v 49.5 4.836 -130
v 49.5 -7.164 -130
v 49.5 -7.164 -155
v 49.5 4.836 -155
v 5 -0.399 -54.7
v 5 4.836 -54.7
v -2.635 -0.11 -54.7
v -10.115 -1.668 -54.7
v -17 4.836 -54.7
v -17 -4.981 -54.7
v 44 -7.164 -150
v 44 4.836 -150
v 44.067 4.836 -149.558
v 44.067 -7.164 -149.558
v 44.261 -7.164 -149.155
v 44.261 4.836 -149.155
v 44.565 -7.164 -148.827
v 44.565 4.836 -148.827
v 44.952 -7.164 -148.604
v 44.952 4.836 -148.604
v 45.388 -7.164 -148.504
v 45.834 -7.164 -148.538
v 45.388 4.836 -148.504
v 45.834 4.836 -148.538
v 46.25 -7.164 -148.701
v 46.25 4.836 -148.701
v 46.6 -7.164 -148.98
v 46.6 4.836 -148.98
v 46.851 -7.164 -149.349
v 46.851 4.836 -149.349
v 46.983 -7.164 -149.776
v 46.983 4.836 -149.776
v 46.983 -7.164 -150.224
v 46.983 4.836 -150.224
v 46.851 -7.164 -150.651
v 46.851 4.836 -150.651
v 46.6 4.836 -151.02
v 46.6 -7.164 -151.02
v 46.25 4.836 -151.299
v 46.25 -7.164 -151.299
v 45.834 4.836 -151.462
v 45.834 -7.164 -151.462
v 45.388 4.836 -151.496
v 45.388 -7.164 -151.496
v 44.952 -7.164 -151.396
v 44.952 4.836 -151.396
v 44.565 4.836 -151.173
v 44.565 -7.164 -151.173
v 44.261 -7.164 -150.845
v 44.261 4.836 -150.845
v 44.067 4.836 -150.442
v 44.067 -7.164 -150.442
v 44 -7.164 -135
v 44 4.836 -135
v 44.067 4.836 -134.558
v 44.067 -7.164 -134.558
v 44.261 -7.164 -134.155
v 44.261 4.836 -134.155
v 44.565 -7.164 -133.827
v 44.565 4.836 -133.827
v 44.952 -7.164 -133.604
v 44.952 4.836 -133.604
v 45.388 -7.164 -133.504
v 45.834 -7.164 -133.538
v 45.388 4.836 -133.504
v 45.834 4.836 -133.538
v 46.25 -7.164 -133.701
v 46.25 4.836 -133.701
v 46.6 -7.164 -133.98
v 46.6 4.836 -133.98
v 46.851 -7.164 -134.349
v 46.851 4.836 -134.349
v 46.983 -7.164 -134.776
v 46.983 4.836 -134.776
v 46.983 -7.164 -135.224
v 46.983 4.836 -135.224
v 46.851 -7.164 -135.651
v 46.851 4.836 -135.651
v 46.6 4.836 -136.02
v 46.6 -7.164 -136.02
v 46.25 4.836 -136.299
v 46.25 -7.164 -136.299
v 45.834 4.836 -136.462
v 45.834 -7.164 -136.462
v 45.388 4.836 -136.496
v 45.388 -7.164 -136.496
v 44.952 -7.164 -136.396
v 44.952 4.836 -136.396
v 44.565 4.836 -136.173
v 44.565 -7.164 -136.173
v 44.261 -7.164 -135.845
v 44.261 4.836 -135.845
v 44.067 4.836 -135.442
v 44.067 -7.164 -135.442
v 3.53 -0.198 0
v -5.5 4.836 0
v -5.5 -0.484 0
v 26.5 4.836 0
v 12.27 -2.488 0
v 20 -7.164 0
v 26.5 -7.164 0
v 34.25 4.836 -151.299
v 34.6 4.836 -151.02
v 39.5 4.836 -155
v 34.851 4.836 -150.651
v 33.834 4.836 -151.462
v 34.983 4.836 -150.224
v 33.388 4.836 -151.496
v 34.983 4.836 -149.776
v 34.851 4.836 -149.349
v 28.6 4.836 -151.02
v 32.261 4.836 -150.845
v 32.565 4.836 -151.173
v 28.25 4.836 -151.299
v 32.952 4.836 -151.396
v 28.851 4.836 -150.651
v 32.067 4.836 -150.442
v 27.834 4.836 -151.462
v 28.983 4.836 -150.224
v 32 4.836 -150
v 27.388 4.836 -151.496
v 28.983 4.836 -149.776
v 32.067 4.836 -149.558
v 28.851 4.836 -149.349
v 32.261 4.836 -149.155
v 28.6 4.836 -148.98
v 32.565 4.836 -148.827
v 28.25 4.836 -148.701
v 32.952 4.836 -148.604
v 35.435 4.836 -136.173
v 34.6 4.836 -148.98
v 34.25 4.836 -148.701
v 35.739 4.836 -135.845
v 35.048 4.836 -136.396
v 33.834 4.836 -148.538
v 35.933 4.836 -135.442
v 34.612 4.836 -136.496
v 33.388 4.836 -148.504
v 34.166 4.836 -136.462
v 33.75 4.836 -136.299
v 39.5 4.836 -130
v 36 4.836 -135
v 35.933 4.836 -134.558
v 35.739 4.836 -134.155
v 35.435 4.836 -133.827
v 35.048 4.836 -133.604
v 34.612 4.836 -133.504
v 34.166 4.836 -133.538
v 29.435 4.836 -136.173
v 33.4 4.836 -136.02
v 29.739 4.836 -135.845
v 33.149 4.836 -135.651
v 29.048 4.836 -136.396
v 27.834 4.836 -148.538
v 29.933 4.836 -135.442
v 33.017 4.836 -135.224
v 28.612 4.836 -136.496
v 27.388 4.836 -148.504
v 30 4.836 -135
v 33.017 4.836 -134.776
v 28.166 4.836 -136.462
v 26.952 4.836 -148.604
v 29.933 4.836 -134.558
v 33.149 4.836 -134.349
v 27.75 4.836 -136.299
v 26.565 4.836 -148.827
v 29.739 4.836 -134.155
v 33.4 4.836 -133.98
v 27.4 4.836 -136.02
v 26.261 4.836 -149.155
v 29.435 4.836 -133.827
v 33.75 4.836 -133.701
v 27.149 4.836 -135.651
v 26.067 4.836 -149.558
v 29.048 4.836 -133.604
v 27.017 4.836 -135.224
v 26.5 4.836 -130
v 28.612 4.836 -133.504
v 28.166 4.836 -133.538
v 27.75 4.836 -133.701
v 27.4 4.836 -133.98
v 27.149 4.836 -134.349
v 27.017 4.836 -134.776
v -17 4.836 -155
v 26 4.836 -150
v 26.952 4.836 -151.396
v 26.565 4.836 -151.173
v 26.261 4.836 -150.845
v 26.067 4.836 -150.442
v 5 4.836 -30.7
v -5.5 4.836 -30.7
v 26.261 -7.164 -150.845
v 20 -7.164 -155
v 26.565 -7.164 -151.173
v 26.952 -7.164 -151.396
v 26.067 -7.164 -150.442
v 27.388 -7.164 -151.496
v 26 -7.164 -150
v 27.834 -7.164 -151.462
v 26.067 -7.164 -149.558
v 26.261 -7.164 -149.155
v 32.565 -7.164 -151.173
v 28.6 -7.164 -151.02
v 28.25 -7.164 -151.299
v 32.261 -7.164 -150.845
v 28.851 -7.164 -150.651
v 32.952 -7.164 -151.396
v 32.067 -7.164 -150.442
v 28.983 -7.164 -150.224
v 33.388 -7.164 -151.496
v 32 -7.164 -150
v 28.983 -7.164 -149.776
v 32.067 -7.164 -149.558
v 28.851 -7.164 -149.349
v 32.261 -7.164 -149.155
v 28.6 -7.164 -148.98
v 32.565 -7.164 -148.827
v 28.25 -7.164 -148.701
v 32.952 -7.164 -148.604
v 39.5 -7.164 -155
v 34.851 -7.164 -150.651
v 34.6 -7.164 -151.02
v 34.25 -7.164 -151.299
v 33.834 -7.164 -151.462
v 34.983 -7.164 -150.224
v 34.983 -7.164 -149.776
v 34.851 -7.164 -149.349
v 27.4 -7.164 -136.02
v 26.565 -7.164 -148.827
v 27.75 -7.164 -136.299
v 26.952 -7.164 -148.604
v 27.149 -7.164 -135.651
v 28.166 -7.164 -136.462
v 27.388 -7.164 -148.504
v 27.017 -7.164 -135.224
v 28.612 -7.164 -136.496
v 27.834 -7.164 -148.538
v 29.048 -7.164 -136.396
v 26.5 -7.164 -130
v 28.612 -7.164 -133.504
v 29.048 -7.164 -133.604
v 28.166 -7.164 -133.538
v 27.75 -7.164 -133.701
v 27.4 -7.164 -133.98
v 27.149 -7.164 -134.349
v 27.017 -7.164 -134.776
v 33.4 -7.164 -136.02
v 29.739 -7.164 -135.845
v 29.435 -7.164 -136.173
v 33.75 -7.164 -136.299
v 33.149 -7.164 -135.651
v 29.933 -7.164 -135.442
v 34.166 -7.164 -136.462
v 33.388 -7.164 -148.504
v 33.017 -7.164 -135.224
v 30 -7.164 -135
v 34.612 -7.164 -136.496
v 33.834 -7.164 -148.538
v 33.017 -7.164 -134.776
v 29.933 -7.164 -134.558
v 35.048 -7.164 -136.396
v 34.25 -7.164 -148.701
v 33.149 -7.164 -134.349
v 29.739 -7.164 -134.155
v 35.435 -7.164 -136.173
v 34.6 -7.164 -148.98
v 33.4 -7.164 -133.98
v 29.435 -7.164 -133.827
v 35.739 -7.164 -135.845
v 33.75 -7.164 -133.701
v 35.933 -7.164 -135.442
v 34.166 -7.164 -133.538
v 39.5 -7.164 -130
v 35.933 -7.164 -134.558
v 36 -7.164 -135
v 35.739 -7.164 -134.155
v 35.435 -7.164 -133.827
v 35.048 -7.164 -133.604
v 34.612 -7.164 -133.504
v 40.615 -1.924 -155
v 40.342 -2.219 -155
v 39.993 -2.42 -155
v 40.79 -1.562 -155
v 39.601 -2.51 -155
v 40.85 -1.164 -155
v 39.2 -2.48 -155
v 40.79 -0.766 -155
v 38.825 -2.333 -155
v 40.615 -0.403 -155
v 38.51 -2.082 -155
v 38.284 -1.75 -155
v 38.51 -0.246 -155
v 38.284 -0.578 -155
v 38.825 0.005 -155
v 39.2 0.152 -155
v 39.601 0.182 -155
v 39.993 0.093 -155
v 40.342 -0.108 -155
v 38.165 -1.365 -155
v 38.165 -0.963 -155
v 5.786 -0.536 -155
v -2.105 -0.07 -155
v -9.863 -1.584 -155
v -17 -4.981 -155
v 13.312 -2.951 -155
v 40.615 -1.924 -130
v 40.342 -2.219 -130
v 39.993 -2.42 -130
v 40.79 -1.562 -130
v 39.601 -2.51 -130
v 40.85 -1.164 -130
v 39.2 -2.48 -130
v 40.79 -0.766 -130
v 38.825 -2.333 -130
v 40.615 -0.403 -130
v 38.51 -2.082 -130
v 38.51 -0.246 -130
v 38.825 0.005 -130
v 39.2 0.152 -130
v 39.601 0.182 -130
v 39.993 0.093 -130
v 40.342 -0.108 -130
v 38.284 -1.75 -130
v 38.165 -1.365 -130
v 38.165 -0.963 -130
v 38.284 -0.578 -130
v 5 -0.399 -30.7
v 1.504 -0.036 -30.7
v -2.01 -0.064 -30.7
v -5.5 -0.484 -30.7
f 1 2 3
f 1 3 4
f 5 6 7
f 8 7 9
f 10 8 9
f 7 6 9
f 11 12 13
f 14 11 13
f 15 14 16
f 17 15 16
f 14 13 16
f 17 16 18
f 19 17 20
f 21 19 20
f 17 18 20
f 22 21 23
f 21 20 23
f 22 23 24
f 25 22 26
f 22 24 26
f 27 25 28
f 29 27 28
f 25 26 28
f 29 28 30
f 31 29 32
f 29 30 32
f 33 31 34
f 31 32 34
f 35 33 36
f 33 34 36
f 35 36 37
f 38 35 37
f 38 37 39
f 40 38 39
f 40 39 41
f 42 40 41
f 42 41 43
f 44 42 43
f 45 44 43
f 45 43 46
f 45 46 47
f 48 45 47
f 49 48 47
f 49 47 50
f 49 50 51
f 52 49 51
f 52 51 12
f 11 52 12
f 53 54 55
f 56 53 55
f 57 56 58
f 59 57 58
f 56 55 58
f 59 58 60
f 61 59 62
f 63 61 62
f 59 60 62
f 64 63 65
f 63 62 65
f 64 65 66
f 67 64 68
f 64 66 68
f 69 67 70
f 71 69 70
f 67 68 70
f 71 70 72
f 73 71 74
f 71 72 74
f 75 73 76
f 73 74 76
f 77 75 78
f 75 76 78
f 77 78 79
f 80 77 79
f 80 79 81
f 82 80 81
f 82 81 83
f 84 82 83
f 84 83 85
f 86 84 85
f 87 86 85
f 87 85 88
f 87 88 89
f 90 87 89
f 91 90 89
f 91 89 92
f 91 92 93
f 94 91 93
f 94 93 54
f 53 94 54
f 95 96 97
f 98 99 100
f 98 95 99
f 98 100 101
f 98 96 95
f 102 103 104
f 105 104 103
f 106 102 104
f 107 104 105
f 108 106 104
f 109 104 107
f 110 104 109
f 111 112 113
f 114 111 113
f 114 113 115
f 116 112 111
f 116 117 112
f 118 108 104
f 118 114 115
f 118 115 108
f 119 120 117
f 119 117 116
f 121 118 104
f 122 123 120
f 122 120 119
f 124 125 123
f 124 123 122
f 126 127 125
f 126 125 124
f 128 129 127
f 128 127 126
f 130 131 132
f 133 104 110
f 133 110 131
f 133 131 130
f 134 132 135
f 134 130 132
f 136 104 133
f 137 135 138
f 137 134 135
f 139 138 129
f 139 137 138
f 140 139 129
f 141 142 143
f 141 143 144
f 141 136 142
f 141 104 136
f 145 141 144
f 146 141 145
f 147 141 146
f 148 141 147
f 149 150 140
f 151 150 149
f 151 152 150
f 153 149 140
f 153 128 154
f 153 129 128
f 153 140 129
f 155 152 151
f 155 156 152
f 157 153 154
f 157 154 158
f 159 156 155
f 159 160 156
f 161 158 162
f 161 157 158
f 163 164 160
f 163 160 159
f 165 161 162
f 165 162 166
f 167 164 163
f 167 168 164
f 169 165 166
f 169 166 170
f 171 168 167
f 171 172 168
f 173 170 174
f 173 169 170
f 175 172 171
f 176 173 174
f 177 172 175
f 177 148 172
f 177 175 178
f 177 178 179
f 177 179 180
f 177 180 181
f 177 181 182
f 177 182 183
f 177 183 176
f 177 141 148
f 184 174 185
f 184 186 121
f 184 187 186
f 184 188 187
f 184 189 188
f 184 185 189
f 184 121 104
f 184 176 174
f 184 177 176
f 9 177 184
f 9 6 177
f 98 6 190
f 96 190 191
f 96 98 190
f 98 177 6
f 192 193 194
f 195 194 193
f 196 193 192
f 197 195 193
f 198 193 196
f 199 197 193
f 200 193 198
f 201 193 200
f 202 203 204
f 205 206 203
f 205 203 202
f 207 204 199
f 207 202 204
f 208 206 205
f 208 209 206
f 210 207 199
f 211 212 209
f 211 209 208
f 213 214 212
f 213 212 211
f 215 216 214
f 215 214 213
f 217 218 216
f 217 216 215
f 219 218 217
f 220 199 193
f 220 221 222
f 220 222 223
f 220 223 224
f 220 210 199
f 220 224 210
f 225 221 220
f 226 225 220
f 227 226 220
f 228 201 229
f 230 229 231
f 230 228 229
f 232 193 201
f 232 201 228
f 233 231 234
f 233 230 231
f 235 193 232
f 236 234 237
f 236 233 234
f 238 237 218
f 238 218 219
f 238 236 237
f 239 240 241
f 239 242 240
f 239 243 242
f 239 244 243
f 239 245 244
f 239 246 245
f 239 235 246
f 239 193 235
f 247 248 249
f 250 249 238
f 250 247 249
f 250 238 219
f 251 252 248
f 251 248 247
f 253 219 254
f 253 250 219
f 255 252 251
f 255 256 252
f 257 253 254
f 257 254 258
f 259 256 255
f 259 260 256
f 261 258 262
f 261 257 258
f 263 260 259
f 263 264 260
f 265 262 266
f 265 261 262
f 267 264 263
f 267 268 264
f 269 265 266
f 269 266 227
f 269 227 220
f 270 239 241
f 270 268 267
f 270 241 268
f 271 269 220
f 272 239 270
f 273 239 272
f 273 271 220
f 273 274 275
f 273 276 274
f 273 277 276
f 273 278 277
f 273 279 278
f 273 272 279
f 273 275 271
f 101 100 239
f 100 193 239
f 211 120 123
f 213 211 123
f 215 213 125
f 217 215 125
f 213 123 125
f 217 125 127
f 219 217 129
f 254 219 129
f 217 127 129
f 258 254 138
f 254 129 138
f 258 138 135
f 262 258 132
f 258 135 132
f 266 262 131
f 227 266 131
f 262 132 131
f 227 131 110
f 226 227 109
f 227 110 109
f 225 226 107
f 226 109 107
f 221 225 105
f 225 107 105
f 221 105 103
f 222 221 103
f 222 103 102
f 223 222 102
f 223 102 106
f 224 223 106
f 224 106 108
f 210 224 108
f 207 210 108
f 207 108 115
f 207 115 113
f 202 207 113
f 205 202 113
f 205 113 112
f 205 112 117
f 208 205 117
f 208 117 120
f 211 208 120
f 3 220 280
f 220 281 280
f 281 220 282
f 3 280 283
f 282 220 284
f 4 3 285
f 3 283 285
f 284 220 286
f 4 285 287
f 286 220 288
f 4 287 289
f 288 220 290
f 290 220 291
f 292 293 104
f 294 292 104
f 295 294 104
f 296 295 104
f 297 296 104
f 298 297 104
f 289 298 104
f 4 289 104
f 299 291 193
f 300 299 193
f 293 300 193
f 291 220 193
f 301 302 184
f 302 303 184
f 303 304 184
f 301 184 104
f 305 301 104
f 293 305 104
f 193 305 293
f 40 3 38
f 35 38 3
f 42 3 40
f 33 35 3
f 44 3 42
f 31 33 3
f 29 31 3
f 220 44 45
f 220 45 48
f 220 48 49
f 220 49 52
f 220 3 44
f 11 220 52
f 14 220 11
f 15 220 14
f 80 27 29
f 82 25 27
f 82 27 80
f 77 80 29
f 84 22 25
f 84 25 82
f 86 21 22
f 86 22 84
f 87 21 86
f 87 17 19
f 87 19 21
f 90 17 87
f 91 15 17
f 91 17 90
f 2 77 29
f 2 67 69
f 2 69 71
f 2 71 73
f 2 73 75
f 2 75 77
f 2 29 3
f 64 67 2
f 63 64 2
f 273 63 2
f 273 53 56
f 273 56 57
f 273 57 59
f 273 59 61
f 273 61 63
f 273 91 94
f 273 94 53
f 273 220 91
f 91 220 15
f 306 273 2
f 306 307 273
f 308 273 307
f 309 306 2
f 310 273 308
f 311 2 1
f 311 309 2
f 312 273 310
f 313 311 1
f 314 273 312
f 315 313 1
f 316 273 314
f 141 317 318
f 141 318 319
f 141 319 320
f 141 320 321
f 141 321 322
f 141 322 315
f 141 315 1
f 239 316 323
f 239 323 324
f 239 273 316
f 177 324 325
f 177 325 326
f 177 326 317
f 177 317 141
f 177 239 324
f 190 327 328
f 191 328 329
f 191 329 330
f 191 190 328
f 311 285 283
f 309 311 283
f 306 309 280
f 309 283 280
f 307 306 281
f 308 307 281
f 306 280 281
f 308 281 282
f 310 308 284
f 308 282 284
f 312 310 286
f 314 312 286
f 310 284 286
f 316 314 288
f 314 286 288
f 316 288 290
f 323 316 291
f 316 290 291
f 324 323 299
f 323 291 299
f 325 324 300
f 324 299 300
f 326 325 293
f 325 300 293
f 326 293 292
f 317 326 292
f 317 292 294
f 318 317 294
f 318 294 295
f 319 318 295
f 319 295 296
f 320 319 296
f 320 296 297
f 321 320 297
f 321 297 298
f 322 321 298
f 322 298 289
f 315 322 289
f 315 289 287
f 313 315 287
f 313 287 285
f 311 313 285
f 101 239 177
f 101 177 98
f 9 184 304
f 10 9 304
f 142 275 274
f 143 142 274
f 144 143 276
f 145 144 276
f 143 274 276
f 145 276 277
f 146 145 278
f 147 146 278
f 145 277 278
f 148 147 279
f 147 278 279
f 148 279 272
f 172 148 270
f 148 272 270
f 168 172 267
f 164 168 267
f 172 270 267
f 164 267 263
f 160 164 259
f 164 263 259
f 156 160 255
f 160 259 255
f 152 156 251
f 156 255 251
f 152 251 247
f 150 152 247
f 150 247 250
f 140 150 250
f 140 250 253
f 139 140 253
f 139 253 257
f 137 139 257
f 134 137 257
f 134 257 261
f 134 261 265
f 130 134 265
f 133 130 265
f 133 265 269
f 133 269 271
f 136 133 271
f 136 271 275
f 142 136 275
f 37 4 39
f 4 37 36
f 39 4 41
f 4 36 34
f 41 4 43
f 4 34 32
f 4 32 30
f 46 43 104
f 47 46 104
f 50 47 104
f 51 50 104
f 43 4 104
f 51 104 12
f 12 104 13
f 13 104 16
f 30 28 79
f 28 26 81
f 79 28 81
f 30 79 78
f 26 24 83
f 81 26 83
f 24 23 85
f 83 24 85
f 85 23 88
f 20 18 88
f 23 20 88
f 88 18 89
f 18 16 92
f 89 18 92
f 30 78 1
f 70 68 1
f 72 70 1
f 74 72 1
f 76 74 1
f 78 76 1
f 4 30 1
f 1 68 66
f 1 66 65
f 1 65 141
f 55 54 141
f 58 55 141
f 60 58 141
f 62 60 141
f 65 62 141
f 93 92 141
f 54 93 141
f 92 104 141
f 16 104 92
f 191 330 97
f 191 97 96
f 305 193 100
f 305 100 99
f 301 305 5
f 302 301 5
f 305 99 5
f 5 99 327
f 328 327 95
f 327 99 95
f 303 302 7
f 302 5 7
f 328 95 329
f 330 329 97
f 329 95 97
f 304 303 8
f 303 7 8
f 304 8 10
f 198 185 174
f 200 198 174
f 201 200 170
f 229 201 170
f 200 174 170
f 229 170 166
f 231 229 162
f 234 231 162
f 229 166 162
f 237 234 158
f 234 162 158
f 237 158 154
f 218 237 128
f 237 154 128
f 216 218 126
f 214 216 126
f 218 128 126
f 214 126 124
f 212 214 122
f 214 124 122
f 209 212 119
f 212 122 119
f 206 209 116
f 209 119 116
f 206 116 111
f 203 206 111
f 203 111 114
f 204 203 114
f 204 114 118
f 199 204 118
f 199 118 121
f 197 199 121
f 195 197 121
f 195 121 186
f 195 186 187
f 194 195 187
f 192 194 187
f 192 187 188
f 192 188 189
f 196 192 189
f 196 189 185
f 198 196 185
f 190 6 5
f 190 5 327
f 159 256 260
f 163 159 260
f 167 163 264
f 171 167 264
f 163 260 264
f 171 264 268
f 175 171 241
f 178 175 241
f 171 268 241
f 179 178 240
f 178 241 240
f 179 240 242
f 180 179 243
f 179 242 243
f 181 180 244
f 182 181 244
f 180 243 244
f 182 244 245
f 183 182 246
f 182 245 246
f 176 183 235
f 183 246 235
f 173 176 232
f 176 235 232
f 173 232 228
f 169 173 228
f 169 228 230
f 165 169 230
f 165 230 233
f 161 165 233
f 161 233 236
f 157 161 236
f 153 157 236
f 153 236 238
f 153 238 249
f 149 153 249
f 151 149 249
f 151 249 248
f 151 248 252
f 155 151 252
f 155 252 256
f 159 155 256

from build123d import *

# Parameters (mm, degrees)
PAD_DEPTH       = 155
SKETCH001_R     = 1.5
SKETCH001_W     = 13
SKETCH001_H     = 130
POCKET_DEPTH    = 12.001
SKETCH002_W     = 5.583172
SKETCH002_H     = 23.950112
POCKET001_DEPTH = 155.001
SKETCH003_W     = 22
SKETCH003_H     = 24
POCKET002_DEPTH = 12.001
SKETCH004_W     = 11.5
SKETCH004_H     = 12.924639
POCKET003_DEPTH = 31
SKETCH005_W     = 12
SKETCH005_H     = 25
PAD001_DEPTH    = 10
SKETCH006_R     = 1.35
POCKET004_DEPTH = 155.001
SKETCH007_R     = 1.5
POCKET005_DEPTH = 12.001003


with BuildPart() as part:
    # Sketch → Pad (new body)
    with BuildSketch(Plane.XY):
        with BuildLine():
            Line((39.5, 4.836187), (-20, 4.836187))
            Line((-20, 4.836187), (-20, -7.163813))
            ThreePointArc((20, -7.163813), (0, 0), (-20, -7.163813))
            Line((20, -7.163813), (39.5, -7.163813))
            Line((39.5, 4.836187), (39.5, -7.163813))
        make_face()
    extrude(amount=-PAD_DEPTH)

    # Sketch001 → Pocket (cut, through all)
    with BuildSketch(Plane.XZ.offset(7.163813)):
        with Locations((28.5, -135)):
            Circle(SKETCH001_R)
        with Locations((34.5, -135)):
            Circle(SKETCH001_R)
        with Locations((33, -65)):
            Rectangle(SKETCH001_W, SKETCH001_H)
    extrude(amount=-POCKET_DEPTH, mode=Mode.SUBTRACT)

    # Sketch002 → Pocket001 (cut, through all)
    with BuildSketch(Plane(origin=(0, 0, -155), x_dir=(1, 0, 0), z_dir=(0, 0, -1))):
        with Locations((-19.791586, -0.240771)):
            Rectangle(SKETCH002_W, SKETCH002_H)
    extrude(amount=-POCKET001_DEPTH, mode=Mode.SUBTRACT)

    # Sketch003 → Pocket002 (cut, through all)
    with BuildSketch(Plane(origin=(0, 4.836187, 0), x_dir=(-1, 0, 0), z_dir=(0, 1, 0))):
        with Locations((6, -42.7)):
            Rectangle(SKETCH003_W, SKETCH003_H)
    extrude(amount=-POCKET002_DEPTH, mode=Mode.SUBTRACT)

    # Sketch004 → Pocket003 (cut)
    with BuildSketch(Plane.XY):
        with Locations((-11.25, 0.936987)):
            Rectangle(SKETCH004_W, SKETCH004_H)
    extrude(amount=-POCKET003_DEPTH, mode=Mode.SUBTRACT)

    # Sketch005 → Pad001 (new body)
    with BuildSketch(Plane.YZ.offset(39.5)):
        with Locations((-1.16381, -142.5)):
            Rectangle(SKETCH005_W, SKETCH005_H)
    extrude(amount=PAD001_DEPTH)

    # Sketch006 → Pocket004 (cut, through all)
    with BuildSketch(Plane(origin=(0, 0, -155), x_dir=(1, 0, 0), z_dir=(0, 0, -1))):
        with Locations((39.5, 1.16381)):
            Circle(SKETCH006_R)
    extrude(amount=-POCKET004_DEPTH, mode=Mode.SUBTRACT)

    # Sketch007 → Pocket005 (cut, through all)
    with BuildSketch(Plane(origin=(0, 4.83619, 0), x_dir=(-1, 0, 0), z_dir=(0, 1, 0))):
        with Locations((-45.5, -135)):
            Circle(SKETCH007_R)
        with Locations((-45.5, -150)):
            Circle(SKETCH007_R)
        with Locations((-33.5, -150)):
            Circle(SKETCH007_R)
        with Locations((-27.5, -150)):
            Circle(SKETCH007_R)
    extrude(amount=-POCKET005_DEPTH, mode=Mode.SUBTRACT)


solid = part.part
